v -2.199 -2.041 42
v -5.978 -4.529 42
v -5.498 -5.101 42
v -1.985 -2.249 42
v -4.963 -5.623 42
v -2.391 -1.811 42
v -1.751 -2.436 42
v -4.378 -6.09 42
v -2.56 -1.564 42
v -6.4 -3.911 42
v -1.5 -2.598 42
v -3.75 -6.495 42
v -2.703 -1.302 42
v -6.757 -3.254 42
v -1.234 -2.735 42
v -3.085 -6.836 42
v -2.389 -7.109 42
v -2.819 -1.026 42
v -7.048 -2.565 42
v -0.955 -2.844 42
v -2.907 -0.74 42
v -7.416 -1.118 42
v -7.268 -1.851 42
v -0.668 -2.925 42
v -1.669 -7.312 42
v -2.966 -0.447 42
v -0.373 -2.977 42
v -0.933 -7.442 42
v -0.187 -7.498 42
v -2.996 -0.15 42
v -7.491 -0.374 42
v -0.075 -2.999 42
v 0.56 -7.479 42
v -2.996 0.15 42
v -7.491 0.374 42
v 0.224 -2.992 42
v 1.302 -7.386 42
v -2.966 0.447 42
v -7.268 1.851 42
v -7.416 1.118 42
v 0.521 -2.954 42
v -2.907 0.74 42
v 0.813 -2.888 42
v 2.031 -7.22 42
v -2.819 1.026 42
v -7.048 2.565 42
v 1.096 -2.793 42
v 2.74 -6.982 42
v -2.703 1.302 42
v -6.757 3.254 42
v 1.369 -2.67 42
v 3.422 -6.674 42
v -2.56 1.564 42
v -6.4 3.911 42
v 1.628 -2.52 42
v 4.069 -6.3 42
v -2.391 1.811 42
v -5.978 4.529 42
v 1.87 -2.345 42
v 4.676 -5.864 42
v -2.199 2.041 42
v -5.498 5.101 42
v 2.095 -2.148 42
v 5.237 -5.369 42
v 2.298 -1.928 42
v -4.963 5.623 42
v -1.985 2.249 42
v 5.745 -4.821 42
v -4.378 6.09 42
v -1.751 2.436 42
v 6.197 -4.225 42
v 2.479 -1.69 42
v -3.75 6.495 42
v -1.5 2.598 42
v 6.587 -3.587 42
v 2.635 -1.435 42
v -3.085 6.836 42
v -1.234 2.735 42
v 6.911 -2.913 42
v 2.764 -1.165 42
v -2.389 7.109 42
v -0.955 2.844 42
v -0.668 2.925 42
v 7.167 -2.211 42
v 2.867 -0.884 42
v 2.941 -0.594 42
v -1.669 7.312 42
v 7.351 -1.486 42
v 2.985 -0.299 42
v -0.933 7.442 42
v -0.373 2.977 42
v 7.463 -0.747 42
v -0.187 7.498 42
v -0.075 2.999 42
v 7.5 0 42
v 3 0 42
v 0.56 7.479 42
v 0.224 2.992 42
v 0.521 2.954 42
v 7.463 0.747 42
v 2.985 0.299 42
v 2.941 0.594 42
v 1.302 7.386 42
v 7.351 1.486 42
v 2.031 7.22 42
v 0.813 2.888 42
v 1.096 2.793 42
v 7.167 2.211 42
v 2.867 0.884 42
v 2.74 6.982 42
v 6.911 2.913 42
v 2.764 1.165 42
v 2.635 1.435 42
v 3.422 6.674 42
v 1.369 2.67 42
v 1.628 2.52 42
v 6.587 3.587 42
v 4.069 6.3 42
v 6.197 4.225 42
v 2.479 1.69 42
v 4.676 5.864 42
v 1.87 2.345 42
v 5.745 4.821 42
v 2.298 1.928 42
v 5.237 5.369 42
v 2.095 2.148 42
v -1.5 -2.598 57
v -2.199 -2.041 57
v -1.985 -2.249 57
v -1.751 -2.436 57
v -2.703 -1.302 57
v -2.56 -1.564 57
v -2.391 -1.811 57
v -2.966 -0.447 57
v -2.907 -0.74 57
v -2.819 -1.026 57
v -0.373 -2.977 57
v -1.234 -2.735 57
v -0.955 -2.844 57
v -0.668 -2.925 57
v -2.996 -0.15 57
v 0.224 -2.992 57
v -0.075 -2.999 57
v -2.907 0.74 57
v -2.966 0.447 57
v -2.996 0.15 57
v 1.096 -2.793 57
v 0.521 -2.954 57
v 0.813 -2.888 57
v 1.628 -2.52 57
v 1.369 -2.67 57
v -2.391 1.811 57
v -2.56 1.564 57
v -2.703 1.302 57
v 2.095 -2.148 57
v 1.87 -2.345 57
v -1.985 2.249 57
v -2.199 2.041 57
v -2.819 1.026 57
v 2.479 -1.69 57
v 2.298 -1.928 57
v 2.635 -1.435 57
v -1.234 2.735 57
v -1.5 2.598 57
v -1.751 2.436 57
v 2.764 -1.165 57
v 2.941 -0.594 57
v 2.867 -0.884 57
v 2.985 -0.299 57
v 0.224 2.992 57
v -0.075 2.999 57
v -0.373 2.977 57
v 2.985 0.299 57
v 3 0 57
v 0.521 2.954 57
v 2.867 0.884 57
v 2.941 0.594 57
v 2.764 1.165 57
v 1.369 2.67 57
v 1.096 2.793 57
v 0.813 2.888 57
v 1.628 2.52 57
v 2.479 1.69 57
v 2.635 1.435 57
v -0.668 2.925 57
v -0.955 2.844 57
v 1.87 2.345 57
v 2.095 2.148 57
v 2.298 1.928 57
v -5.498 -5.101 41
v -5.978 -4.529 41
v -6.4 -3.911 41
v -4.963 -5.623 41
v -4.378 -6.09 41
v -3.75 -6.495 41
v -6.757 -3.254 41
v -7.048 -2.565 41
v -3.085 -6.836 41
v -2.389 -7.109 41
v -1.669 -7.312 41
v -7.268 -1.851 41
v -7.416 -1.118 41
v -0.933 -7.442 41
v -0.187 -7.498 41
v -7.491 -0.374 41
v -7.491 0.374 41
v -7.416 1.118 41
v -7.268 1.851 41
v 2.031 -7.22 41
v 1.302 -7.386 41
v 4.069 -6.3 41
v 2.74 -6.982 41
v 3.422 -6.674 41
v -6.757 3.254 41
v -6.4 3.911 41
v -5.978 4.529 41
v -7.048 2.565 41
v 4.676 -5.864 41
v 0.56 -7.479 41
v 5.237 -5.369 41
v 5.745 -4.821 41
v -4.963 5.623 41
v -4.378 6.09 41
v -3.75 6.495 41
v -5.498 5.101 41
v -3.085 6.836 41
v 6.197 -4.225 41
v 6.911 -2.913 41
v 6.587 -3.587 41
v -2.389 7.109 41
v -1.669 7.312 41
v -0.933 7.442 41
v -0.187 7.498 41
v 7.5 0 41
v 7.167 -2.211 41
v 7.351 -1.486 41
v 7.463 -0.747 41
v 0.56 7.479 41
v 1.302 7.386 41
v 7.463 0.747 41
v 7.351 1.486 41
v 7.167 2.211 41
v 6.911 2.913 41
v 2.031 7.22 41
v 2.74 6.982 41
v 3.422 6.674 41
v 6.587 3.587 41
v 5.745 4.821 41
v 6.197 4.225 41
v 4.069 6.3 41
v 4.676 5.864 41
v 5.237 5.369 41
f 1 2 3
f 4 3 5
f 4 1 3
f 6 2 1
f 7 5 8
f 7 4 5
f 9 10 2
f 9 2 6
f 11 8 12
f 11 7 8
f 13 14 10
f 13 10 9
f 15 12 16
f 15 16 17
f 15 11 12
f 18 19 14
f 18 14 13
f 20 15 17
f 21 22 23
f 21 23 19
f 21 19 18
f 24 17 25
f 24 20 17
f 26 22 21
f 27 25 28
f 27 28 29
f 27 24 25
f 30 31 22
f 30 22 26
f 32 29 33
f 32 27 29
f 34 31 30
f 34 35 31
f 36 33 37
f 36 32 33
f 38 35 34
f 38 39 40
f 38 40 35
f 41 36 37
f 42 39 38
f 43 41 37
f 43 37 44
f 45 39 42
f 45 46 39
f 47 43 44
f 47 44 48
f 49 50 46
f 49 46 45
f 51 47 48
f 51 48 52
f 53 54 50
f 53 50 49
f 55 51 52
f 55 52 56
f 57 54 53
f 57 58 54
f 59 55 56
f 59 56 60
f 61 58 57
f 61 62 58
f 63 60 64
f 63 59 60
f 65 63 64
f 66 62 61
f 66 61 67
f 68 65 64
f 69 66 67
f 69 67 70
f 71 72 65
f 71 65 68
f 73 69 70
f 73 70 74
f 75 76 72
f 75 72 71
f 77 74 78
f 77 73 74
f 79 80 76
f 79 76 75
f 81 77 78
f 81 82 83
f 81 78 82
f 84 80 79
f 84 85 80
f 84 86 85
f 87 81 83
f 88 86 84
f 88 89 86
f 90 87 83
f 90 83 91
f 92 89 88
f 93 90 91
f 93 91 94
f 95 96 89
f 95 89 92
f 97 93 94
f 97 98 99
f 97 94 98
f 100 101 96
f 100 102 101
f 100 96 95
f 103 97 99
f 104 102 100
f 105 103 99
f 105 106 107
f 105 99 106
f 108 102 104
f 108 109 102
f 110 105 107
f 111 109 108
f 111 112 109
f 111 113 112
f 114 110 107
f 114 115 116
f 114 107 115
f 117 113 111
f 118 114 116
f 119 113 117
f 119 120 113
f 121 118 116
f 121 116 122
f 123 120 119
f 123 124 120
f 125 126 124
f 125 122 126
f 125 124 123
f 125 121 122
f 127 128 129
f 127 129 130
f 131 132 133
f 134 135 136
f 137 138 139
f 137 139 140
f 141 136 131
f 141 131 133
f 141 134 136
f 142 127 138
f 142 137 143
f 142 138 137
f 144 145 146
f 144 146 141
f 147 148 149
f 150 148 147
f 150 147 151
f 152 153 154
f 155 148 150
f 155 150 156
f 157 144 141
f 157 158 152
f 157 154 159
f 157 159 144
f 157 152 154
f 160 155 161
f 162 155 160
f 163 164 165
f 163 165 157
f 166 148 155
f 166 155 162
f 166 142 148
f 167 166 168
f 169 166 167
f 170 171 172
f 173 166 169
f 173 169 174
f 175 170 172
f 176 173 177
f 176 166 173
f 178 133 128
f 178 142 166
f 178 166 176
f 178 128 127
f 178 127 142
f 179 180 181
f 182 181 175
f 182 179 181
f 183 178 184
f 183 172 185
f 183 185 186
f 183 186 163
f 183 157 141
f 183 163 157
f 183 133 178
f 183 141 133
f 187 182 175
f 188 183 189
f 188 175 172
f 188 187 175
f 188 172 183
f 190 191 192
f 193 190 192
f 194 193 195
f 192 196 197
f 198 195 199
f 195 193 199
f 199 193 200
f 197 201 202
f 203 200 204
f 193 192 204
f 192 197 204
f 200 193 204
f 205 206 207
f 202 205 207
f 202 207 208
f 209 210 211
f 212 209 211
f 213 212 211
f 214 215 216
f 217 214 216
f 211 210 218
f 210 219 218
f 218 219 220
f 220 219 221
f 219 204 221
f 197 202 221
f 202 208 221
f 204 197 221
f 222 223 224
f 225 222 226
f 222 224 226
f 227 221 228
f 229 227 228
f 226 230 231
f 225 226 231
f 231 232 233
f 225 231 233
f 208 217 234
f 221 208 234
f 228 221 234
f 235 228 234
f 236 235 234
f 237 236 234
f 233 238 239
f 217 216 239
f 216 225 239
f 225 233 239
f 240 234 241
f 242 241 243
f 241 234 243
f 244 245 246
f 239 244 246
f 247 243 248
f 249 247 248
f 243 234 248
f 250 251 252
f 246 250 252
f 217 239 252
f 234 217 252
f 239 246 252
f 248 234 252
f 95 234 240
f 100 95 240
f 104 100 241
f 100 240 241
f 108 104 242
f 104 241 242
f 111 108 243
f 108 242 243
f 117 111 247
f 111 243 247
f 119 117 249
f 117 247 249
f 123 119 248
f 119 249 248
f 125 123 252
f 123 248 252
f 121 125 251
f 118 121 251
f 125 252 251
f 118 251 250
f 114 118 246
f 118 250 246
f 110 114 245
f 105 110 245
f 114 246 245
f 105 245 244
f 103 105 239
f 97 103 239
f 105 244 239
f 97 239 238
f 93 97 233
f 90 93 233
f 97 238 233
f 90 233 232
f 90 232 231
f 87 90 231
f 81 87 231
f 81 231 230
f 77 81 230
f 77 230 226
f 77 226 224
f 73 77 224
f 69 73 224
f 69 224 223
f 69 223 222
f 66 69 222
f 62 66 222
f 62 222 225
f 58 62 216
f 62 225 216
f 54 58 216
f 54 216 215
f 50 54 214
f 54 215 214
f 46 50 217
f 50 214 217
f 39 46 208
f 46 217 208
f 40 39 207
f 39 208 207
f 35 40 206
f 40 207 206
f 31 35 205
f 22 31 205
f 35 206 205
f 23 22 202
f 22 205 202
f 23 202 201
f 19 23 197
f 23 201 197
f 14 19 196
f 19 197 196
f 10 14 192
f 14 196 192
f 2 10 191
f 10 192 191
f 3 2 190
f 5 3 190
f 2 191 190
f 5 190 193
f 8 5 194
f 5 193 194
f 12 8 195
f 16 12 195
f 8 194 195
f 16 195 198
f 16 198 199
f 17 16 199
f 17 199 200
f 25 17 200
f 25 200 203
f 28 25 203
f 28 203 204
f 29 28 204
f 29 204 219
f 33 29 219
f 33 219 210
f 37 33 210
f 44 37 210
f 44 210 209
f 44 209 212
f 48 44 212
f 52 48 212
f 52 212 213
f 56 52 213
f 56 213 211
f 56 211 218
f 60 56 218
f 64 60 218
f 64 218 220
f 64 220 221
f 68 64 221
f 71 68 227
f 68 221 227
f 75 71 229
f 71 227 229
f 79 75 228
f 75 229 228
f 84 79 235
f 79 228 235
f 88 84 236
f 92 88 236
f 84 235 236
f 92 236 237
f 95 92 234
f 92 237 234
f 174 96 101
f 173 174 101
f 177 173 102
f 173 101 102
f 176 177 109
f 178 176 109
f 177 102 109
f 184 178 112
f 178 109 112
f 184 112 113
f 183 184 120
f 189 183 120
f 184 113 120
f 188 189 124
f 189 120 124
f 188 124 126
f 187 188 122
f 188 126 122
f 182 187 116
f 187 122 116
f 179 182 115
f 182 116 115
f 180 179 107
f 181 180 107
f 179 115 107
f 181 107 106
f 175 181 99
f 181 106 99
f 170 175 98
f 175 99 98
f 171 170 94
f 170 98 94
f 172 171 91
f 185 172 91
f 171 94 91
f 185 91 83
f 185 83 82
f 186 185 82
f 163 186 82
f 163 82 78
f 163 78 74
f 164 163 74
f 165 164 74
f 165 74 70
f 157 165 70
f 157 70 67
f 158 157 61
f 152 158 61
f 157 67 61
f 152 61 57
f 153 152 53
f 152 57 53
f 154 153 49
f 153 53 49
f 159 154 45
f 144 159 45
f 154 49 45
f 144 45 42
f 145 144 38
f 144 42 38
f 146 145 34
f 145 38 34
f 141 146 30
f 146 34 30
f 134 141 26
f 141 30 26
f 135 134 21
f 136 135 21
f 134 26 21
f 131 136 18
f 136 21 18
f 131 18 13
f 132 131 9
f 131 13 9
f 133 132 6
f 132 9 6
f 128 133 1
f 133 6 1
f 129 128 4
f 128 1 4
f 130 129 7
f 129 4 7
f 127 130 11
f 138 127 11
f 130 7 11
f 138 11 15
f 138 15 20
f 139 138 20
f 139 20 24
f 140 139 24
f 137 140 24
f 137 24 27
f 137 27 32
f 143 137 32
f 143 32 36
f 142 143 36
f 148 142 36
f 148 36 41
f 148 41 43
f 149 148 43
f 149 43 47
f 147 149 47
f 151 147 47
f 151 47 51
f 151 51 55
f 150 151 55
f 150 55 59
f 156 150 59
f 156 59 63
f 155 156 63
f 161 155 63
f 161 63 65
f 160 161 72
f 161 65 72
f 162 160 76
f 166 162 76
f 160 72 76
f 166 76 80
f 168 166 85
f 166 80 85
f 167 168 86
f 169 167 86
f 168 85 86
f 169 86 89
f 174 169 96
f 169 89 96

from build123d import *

# Parameters (mm, degrees)
CYLINDER002_R     = 3
CYLINDER002_DEPTH = 15
CYLINDER001_R     = 7.5
CYLINDER001_DEPTH = 1
CYLINDER_R        = 11.5
CYLINDER_DEPTH    = 40
SKETCH_R          = 1
POCKET_DEPTH      = 4
SKETCH001_R       = 23.34615
EXTRUDE_DEPTH     = 23


with BuildPart() as cylinder002:
    # Cylinder002 → Cylinder002 (new body)
    with BuildSketch(Plane.XY.offset(42)):
        Circle(CYLINDER002_R)
    extrude(amount=CYLINDER002_DEPTH)


with BuildPart() as cylinder001:
    # Cylinder001 → Cylinder001 (new body)
    with BuildSketch(Plane.XY.offset(41)):
        Circle(CYLINDER001_R)
    extrude(amount=CYLINDER001_DEPTH)


with BuildPart() as clone_of_pocket:
    # Cylinder → Cylinder (new body)
    with BuildSketch(Plane.XY.offset(1)):
        Circle(CYLINDER_R)
    extrude(amount=CYLINDER_DEPTH)

    # Fusion: union Cylinder002, Cylinder001
    add(cylinder002.part)
    add(cylinder001.part)

    # Sketch → Pocket (cut)
    with BuildSketch(Plane.XY.offset(41)):
        with Locations((8.227241, 4.75)):
            Circle(SKETCH_R)
        with Locations((-8.227241, 4.75)):
            Circle(SKETCH_R)
        with Locations((0, -9.5)):
            Circle(SKETCH_R)
    extrude(amount=-POCKET_DEPTH, mode=Mode.SUBTRACT)


with BuildPart() as common:
    # Sketch001 → Extrude (new body)
    with BuildSketch(Plane.XY.offset(41)):
        Circle(SKETCH001_R)
    extrude(amount=EXTRUDE_DEPTH)

    # Common: intersect Clone of Pocket
    add(clone_of_pocket.part, mode=Mode.INTERSECT)


solid = common.part
